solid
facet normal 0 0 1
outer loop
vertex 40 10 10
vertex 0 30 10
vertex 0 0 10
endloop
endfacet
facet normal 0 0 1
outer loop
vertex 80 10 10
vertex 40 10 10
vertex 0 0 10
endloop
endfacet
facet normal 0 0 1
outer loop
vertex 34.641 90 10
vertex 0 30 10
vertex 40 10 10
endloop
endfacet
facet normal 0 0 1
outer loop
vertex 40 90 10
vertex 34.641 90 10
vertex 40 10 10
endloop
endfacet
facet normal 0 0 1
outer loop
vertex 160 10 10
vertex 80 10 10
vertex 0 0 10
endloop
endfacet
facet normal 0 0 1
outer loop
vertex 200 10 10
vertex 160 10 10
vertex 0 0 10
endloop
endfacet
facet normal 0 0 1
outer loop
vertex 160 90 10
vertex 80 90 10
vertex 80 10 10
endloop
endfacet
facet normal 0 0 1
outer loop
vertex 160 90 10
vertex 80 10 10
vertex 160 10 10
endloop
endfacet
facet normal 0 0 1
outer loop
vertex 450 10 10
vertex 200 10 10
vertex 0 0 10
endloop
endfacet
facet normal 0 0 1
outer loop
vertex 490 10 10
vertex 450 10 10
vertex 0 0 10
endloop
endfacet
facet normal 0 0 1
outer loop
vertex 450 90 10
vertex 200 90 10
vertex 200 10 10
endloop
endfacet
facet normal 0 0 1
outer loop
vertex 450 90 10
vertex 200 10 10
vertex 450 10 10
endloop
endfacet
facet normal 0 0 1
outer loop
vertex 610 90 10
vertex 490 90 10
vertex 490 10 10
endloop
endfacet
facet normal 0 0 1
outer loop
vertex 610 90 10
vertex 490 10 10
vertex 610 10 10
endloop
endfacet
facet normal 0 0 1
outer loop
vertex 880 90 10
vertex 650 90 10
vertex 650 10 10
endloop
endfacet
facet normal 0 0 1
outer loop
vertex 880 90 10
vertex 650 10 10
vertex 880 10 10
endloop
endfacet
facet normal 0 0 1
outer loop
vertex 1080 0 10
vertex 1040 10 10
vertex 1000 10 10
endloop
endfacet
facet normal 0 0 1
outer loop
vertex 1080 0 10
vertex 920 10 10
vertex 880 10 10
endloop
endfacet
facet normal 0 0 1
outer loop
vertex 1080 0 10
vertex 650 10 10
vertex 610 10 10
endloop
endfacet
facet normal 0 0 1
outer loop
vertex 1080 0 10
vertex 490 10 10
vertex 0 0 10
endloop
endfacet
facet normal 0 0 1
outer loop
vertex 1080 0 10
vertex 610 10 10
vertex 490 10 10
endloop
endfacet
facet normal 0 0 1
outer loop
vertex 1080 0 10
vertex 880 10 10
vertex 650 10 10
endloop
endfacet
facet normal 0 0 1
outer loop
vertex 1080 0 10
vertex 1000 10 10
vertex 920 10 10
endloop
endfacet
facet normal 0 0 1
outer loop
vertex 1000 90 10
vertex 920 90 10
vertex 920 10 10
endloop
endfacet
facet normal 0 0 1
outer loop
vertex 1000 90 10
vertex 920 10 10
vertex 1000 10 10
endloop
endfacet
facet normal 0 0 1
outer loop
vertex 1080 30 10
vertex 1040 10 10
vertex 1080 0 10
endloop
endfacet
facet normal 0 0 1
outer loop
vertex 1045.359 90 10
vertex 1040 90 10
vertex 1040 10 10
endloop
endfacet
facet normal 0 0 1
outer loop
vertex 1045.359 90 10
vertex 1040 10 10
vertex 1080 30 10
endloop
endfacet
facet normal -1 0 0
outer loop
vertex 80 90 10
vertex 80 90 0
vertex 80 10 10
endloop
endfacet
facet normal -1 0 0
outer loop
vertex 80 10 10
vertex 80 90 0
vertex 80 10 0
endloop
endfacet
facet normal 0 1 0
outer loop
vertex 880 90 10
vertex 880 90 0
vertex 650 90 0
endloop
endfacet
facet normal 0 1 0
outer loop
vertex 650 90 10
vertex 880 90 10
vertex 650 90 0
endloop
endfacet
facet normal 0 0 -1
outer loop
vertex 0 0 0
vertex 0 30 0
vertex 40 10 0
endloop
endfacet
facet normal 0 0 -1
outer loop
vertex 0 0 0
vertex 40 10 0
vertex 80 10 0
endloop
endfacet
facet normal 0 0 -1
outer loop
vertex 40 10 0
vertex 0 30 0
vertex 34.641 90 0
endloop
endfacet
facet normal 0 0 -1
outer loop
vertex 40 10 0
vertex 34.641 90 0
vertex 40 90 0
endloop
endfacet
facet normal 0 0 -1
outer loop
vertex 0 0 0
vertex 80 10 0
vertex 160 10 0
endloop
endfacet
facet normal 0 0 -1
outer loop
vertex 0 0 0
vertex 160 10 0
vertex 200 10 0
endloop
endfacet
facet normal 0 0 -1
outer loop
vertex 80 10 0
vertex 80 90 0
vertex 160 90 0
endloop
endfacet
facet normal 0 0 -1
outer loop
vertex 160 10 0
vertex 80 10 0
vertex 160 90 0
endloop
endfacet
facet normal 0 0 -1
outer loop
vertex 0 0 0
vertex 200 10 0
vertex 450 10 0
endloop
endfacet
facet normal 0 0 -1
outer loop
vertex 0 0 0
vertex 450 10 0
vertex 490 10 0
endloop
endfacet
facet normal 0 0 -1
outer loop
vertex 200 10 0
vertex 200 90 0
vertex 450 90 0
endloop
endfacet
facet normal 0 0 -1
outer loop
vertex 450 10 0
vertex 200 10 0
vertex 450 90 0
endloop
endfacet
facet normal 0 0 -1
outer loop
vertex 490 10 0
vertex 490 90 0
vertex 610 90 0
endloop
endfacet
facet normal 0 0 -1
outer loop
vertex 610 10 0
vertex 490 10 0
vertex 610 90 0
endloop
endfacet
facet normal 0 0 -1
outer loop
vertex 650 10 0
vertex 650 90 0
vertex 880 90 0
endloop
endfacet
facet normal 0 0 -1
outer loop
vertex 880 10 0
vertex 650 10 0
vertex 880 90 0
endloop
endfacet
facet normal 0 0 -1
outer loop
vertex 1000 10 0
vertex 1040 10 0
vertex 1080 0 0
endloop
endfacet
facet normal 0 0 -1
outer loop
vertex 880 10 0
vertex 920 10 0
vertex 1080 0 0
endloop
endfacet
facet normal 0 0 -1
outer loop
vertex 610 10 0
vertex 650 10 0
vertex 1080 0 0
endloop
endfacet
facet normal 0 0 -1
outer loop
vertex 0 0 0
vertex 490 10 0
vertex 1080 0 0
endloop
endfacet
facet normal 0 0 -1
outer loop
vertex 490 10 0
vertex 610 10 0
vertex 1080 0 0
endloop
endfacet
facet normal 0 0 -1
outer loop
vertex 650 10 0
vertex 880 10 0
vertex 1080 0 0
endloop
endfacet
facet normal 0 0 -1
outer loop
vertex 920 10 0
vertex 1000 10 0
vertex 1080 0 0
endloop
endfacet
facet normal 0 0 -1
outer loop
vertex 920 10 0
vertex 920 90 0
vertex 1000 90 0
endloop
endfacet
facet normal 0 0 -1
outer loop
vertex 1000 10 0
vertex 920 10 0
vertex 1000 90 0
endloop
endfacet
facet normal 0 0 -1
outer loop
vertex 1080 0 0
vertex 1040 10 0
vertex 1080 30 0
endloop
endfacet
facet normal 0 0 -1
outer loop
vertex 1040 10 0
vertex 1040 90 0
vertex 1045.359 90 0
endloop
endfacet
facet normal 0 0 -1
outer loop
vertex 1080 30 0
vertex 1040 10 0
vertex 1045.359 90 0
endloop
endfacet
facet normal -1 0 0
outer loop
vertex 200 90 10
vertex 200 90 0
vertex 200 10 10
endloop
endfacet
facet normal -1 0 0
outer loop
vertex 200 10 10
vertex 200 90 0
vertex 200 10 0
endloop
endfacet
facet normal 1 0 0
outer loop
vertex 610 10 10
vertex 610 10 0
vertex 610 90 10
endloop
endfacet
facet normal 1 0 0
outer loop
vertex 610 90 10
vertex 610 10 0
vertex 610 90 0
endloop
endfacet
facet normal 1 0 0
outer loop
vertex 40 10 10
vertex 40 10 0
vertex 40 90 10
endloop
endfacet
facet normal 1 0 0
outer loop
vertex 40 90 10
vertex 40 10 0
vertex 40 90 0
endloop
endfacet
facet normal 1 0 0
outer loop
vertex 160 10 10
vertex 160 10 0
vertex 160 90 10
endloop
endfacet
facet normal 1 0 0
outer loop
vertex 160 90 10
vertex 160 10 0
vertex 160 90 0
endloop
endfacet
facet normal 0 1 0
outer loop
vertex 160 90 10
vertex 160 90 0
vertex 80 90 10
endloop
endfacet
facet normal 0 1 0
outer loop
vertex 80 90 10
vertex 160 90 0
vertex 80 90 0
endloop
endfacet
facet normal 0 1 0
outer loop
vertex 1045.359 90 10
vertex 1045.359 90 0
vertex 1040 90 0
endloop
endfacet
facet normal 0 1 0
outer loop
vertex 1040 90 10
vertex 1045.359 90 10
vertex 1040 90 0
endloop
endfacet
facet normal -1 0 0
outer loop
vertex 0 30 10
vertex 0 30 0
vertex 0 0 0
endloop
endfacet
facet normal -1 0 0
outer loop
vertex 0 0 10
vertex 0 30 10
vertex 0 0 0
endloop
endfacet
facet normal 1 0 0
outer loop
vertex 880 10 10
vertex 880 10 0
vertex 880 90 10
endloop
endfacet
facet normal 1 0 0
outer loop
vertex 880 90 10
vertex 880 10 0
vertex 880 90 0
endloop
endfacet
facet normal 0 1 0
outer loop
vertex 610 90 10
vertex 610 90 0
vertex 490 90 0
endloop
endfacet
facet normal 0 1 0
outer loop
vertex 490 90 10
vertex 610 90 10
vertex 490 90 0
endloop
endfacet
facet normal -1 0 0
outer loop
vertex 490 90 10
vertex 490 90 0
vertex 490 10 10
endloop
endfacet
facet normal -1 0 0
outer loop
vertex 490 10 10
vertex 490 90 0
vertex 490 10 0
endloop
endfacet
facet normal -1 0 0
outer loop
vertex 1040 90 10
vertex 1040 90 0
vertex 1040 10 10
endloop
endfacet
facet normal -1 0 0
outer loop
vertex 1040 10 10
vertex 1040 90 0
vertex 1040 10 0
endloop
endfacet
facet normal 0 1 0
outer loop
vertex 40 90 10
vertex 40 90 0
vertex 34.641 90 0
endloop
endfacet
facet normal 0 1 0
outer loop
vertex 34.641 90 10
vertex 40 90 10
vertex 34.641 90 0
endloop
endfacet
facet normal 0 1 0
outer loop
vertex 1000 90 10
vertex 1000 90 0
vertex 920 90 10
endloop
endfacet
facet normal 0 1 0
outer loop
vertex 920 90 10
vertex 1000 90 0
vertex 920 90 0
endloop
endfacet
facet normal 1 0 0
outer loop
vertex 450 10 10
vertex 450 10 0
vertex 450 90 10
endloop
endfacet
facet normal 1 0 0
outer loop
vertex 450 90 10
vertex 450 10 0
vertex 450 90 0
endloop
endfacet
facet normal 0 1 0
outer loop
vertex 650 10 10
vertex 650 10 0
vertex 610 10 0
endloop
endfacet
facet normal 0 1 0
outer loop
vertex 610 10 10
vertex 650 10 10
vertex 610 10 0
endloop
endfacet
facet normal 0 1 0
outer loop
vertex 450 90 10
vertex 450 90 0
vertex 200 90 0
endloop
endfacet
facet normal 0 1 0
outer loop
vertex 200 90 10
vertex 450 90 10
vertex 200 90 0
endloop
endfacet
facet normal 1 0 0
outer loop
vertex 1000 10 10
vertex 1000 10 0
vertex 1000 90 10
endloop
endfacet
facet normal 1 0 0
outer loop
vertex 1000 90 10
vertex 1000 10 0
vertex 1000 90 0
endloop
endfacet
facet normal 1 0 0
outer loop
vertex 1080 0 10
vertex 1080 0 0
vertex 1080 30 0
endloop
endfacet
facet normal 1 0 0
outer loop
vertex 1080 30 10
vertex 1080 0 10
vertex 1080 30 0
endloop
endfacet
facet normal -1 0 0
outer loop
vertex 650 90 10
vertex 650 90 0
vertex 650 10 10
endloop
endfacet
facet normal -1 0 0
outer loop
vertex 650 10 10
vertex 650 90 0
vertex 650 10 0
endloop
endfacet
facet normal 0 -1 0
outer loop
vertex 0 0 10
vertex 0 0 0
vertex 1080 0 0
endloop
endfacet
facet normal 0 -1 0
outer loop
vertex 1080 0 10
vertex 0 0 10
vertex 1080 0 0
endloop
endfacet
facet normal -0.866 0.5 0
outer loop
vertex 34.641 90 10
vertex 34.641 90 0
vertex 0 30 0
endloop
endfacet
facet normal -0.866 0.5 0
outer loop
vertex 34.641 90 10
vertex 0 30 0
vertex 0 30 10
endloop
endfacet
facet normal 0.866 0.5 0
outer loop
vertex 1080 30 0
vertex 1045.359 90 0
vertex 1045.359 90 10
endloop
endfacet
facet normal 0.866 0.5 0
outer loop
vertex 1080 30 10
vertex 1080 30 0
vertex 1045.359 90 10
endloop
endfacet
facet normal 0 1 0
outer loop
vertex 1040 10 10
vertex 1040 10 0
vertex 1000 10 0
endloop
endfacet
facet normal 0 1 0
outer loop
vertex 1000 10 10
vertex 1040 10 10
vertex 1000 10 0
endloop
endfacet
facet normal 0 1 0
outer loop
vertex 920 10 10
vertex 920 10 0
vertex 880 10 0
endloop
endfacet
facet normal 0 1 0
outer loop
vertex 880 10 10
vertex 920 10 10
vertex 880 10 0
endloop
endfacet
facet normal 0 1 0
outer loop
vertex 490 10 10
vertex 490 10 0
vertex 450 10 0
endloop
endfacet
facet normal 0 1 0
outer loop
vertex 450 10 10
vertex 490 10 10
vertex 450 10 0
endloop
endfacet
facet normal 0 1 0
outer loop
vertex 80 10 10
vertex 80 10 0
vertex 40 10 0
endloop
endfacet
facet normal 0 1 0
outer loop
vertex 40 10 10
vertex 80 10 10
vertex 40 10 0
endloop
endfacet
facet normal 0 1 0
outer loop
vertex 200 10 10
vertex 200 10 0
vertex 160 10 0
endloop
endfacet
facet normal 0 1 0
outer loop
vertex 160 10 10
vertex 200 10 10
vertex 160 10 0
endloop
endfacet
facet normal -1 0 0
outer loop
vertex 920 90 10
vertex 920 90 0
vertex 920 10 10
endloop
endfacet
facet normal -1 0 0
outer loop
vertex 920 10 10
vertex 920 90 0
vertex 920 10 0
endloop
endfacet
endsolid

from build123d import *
from OCP.BRepFilletAPI import BRepFilletAPI_MakeChamfer

# Parameters (mm, degrees)
BOSS_EXTRU_1_DEPTH = 10
CHANFREIN1_SIZE    = 60
CHANFREIN1_SIZE2   = 34.641016151


with BuildPart() as part:
    # Esquisse1 → Boss.-Extru.1 (new body)
    with BuildSketch(Plane.XY):
        Polygon((0, 0), (1080, 0), (1080, 90), (1040, 90), (1040, 10), (1000, 10), (1000, 90), (920, 90), (920, 10), (880, 10), (880, 90), (650, 90), (650, 10), (610, 10), (610, 90), (490, 90), (490, 10), (450, 10), (450, 90), (200, 90), (200, 10), (160, 10), (160, 90), (80, 90), (80, 10), (40, 10), (40, 90), (0, 90), align=None)
    extrude(amount=BOSS_EXTRU_1_DEPTH)

    # Chanfrein1: one chamfer whose edges measure the first distance from different faces: ONE call of the kernel's chamfer builder (chamfer() names one face for all edges)
    chanfrein1_edges_1 = [part.edges().sort_by_distance(p)[0] for p in [
        (0, 90, 5),
    ]]
    chanfrein1_side_1 = [part.faces().sort_by_distance(p)[0] for p in [
        (0, 45, 5),
    ]]
    chanfrein1_edges_2 = [part.edges().sort_by_distance(p)[0] for p in [
        (1080, 90, 5),
    ]]
    chanfrein1_side_2 = [part.faces().sort_by_distance(p)[0] for p in [
        (1080, 45, 5),
    ]]
    chanfrein1 = BRepFilletAPI_MakeChamfer(part.part.solid().wrapped)
    for e in chanfrein1_edges_1:
        chanfrein1.Add(CHANFREIN1_SIZE, CHANFREIN1_SIZE2, e.wrapped, chanfrein1_side_1[0].wrapped)  # the first distance lies on this face
    for e in chanfrein1_edges_2:
        chanfrein1.Add(CHANFREIN1_SIZE, CHANFREIN1_SIZE2, e.wrapped, chanfrein1_side_2[0].wrapped)  # the first distance lies on this face
    add(Compound.cast(chanfrein1.Shape()), mode=Mode.REPLACE)


solid = part.part
